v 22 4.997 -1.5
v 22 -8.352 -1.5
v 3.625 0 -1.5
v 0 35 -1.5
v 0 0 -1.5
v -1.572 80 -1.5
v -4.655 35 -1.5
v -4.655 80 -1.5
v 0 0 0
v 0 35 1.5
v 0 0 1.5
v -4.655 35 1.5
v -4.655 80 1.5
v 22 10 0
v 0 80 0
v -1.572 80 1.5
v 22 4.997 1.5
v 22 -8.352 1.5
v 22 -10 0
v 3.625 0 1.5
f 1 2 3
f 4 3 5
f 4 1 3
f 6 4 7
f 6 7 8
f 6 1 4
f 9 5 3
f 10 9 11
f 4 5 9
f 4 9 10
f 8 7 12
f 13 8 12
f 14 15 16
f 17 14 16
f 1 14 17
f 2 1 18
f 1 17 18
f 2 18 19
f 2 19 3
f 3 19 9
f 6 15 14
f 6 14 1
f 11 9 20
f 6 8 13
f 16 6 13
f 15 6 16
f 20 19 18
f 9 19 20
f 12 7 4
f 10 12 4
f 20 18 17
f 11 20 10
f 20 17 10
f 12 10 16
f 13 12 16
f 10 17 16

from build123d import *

# Parameters (mm, degrees)
BOSS_EXTRUDE1_DEPTH     = 1.5
SKETCH7_W               = 3
SKETCH7_H               = 80
BOSS_EXTRUDE2_DEPTH     = 4.655
CHAMFER1_SIZE           = 1.5
CUT_EXTRUDE1_DEPTH      = 83.983432081
CUT_EXTRUDE1_DEPTH_BACK = 83.983432081
SKETCH8_W               = 4.655
SKETCH8_H               = 35


with BuildPart() as part:
    # Sketch1 → Boss-Extrude1 (new, symmetric)
    with BuildSketch(Plane.XY):
        Polygon((0, 0), (0, 80), (22, 10), (22, -10), align=None)
    extrude(amount=BOSS_EXTRUDE1_DEPTH, both=True)

    # Sketch7 → Boss-Extrude2 (add)
    with BuildSketch(Plane.ZY):
        with Locations((0, 40)):
            Rectangle(SKETCH7_W, SKETCH7_H)
    extrude(amount=BOSS_EXTRUDE2_DEPTH)

    # Chamfer1
    chamfer1_edges = [part.edges().sort_by_distance(p)[0] for p in [
        (11, -5, 1.5),
        (11, -5, -1.5),
        (11, 45, -1.5),
        (11, 45, 1.5),
    ]]
    chamfer(chamfer1_edges, length=CHAMFER1_SIZE - 0.0001)  # a hair under: the kernel refuses the full size

    # Sketch8 → Cut-Extrude1 (cut, two sides: drawn at the far end of the back side and taken through both)
    with BuildSketch(Plane.XY.offset(-CUT_EXTRUDE1_DEPTH_BACK)):
        with Locations((-2.3275, 17.5)):
            Rectangle(SKETCH8_W, SKETCH8_H)
    extrude(amount=CUT_EXTRUDE1_DEPTH + CUT_EXTRUDE1_DEPTH_BACK, mode=Mode.SUBTRACT)


solid = part.part
